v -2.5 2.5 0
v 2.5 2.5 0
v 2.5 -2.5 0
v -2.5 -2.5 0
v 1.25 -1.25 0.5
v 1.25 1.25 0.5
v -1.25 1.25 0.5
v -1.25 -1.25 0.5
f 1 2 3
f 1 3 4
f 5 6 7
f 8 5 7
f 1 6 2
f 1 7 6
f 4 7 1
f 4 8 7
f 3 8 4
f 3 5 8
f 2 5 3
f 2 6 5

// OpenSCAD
linear_extrude(height = 0.5,scale = 0.5) 
polygon([[-2.5,-2.5],[2.5,-2.5],[2.5,2.5],[-2.5,2.5]],[[0,1,2,3]]);
